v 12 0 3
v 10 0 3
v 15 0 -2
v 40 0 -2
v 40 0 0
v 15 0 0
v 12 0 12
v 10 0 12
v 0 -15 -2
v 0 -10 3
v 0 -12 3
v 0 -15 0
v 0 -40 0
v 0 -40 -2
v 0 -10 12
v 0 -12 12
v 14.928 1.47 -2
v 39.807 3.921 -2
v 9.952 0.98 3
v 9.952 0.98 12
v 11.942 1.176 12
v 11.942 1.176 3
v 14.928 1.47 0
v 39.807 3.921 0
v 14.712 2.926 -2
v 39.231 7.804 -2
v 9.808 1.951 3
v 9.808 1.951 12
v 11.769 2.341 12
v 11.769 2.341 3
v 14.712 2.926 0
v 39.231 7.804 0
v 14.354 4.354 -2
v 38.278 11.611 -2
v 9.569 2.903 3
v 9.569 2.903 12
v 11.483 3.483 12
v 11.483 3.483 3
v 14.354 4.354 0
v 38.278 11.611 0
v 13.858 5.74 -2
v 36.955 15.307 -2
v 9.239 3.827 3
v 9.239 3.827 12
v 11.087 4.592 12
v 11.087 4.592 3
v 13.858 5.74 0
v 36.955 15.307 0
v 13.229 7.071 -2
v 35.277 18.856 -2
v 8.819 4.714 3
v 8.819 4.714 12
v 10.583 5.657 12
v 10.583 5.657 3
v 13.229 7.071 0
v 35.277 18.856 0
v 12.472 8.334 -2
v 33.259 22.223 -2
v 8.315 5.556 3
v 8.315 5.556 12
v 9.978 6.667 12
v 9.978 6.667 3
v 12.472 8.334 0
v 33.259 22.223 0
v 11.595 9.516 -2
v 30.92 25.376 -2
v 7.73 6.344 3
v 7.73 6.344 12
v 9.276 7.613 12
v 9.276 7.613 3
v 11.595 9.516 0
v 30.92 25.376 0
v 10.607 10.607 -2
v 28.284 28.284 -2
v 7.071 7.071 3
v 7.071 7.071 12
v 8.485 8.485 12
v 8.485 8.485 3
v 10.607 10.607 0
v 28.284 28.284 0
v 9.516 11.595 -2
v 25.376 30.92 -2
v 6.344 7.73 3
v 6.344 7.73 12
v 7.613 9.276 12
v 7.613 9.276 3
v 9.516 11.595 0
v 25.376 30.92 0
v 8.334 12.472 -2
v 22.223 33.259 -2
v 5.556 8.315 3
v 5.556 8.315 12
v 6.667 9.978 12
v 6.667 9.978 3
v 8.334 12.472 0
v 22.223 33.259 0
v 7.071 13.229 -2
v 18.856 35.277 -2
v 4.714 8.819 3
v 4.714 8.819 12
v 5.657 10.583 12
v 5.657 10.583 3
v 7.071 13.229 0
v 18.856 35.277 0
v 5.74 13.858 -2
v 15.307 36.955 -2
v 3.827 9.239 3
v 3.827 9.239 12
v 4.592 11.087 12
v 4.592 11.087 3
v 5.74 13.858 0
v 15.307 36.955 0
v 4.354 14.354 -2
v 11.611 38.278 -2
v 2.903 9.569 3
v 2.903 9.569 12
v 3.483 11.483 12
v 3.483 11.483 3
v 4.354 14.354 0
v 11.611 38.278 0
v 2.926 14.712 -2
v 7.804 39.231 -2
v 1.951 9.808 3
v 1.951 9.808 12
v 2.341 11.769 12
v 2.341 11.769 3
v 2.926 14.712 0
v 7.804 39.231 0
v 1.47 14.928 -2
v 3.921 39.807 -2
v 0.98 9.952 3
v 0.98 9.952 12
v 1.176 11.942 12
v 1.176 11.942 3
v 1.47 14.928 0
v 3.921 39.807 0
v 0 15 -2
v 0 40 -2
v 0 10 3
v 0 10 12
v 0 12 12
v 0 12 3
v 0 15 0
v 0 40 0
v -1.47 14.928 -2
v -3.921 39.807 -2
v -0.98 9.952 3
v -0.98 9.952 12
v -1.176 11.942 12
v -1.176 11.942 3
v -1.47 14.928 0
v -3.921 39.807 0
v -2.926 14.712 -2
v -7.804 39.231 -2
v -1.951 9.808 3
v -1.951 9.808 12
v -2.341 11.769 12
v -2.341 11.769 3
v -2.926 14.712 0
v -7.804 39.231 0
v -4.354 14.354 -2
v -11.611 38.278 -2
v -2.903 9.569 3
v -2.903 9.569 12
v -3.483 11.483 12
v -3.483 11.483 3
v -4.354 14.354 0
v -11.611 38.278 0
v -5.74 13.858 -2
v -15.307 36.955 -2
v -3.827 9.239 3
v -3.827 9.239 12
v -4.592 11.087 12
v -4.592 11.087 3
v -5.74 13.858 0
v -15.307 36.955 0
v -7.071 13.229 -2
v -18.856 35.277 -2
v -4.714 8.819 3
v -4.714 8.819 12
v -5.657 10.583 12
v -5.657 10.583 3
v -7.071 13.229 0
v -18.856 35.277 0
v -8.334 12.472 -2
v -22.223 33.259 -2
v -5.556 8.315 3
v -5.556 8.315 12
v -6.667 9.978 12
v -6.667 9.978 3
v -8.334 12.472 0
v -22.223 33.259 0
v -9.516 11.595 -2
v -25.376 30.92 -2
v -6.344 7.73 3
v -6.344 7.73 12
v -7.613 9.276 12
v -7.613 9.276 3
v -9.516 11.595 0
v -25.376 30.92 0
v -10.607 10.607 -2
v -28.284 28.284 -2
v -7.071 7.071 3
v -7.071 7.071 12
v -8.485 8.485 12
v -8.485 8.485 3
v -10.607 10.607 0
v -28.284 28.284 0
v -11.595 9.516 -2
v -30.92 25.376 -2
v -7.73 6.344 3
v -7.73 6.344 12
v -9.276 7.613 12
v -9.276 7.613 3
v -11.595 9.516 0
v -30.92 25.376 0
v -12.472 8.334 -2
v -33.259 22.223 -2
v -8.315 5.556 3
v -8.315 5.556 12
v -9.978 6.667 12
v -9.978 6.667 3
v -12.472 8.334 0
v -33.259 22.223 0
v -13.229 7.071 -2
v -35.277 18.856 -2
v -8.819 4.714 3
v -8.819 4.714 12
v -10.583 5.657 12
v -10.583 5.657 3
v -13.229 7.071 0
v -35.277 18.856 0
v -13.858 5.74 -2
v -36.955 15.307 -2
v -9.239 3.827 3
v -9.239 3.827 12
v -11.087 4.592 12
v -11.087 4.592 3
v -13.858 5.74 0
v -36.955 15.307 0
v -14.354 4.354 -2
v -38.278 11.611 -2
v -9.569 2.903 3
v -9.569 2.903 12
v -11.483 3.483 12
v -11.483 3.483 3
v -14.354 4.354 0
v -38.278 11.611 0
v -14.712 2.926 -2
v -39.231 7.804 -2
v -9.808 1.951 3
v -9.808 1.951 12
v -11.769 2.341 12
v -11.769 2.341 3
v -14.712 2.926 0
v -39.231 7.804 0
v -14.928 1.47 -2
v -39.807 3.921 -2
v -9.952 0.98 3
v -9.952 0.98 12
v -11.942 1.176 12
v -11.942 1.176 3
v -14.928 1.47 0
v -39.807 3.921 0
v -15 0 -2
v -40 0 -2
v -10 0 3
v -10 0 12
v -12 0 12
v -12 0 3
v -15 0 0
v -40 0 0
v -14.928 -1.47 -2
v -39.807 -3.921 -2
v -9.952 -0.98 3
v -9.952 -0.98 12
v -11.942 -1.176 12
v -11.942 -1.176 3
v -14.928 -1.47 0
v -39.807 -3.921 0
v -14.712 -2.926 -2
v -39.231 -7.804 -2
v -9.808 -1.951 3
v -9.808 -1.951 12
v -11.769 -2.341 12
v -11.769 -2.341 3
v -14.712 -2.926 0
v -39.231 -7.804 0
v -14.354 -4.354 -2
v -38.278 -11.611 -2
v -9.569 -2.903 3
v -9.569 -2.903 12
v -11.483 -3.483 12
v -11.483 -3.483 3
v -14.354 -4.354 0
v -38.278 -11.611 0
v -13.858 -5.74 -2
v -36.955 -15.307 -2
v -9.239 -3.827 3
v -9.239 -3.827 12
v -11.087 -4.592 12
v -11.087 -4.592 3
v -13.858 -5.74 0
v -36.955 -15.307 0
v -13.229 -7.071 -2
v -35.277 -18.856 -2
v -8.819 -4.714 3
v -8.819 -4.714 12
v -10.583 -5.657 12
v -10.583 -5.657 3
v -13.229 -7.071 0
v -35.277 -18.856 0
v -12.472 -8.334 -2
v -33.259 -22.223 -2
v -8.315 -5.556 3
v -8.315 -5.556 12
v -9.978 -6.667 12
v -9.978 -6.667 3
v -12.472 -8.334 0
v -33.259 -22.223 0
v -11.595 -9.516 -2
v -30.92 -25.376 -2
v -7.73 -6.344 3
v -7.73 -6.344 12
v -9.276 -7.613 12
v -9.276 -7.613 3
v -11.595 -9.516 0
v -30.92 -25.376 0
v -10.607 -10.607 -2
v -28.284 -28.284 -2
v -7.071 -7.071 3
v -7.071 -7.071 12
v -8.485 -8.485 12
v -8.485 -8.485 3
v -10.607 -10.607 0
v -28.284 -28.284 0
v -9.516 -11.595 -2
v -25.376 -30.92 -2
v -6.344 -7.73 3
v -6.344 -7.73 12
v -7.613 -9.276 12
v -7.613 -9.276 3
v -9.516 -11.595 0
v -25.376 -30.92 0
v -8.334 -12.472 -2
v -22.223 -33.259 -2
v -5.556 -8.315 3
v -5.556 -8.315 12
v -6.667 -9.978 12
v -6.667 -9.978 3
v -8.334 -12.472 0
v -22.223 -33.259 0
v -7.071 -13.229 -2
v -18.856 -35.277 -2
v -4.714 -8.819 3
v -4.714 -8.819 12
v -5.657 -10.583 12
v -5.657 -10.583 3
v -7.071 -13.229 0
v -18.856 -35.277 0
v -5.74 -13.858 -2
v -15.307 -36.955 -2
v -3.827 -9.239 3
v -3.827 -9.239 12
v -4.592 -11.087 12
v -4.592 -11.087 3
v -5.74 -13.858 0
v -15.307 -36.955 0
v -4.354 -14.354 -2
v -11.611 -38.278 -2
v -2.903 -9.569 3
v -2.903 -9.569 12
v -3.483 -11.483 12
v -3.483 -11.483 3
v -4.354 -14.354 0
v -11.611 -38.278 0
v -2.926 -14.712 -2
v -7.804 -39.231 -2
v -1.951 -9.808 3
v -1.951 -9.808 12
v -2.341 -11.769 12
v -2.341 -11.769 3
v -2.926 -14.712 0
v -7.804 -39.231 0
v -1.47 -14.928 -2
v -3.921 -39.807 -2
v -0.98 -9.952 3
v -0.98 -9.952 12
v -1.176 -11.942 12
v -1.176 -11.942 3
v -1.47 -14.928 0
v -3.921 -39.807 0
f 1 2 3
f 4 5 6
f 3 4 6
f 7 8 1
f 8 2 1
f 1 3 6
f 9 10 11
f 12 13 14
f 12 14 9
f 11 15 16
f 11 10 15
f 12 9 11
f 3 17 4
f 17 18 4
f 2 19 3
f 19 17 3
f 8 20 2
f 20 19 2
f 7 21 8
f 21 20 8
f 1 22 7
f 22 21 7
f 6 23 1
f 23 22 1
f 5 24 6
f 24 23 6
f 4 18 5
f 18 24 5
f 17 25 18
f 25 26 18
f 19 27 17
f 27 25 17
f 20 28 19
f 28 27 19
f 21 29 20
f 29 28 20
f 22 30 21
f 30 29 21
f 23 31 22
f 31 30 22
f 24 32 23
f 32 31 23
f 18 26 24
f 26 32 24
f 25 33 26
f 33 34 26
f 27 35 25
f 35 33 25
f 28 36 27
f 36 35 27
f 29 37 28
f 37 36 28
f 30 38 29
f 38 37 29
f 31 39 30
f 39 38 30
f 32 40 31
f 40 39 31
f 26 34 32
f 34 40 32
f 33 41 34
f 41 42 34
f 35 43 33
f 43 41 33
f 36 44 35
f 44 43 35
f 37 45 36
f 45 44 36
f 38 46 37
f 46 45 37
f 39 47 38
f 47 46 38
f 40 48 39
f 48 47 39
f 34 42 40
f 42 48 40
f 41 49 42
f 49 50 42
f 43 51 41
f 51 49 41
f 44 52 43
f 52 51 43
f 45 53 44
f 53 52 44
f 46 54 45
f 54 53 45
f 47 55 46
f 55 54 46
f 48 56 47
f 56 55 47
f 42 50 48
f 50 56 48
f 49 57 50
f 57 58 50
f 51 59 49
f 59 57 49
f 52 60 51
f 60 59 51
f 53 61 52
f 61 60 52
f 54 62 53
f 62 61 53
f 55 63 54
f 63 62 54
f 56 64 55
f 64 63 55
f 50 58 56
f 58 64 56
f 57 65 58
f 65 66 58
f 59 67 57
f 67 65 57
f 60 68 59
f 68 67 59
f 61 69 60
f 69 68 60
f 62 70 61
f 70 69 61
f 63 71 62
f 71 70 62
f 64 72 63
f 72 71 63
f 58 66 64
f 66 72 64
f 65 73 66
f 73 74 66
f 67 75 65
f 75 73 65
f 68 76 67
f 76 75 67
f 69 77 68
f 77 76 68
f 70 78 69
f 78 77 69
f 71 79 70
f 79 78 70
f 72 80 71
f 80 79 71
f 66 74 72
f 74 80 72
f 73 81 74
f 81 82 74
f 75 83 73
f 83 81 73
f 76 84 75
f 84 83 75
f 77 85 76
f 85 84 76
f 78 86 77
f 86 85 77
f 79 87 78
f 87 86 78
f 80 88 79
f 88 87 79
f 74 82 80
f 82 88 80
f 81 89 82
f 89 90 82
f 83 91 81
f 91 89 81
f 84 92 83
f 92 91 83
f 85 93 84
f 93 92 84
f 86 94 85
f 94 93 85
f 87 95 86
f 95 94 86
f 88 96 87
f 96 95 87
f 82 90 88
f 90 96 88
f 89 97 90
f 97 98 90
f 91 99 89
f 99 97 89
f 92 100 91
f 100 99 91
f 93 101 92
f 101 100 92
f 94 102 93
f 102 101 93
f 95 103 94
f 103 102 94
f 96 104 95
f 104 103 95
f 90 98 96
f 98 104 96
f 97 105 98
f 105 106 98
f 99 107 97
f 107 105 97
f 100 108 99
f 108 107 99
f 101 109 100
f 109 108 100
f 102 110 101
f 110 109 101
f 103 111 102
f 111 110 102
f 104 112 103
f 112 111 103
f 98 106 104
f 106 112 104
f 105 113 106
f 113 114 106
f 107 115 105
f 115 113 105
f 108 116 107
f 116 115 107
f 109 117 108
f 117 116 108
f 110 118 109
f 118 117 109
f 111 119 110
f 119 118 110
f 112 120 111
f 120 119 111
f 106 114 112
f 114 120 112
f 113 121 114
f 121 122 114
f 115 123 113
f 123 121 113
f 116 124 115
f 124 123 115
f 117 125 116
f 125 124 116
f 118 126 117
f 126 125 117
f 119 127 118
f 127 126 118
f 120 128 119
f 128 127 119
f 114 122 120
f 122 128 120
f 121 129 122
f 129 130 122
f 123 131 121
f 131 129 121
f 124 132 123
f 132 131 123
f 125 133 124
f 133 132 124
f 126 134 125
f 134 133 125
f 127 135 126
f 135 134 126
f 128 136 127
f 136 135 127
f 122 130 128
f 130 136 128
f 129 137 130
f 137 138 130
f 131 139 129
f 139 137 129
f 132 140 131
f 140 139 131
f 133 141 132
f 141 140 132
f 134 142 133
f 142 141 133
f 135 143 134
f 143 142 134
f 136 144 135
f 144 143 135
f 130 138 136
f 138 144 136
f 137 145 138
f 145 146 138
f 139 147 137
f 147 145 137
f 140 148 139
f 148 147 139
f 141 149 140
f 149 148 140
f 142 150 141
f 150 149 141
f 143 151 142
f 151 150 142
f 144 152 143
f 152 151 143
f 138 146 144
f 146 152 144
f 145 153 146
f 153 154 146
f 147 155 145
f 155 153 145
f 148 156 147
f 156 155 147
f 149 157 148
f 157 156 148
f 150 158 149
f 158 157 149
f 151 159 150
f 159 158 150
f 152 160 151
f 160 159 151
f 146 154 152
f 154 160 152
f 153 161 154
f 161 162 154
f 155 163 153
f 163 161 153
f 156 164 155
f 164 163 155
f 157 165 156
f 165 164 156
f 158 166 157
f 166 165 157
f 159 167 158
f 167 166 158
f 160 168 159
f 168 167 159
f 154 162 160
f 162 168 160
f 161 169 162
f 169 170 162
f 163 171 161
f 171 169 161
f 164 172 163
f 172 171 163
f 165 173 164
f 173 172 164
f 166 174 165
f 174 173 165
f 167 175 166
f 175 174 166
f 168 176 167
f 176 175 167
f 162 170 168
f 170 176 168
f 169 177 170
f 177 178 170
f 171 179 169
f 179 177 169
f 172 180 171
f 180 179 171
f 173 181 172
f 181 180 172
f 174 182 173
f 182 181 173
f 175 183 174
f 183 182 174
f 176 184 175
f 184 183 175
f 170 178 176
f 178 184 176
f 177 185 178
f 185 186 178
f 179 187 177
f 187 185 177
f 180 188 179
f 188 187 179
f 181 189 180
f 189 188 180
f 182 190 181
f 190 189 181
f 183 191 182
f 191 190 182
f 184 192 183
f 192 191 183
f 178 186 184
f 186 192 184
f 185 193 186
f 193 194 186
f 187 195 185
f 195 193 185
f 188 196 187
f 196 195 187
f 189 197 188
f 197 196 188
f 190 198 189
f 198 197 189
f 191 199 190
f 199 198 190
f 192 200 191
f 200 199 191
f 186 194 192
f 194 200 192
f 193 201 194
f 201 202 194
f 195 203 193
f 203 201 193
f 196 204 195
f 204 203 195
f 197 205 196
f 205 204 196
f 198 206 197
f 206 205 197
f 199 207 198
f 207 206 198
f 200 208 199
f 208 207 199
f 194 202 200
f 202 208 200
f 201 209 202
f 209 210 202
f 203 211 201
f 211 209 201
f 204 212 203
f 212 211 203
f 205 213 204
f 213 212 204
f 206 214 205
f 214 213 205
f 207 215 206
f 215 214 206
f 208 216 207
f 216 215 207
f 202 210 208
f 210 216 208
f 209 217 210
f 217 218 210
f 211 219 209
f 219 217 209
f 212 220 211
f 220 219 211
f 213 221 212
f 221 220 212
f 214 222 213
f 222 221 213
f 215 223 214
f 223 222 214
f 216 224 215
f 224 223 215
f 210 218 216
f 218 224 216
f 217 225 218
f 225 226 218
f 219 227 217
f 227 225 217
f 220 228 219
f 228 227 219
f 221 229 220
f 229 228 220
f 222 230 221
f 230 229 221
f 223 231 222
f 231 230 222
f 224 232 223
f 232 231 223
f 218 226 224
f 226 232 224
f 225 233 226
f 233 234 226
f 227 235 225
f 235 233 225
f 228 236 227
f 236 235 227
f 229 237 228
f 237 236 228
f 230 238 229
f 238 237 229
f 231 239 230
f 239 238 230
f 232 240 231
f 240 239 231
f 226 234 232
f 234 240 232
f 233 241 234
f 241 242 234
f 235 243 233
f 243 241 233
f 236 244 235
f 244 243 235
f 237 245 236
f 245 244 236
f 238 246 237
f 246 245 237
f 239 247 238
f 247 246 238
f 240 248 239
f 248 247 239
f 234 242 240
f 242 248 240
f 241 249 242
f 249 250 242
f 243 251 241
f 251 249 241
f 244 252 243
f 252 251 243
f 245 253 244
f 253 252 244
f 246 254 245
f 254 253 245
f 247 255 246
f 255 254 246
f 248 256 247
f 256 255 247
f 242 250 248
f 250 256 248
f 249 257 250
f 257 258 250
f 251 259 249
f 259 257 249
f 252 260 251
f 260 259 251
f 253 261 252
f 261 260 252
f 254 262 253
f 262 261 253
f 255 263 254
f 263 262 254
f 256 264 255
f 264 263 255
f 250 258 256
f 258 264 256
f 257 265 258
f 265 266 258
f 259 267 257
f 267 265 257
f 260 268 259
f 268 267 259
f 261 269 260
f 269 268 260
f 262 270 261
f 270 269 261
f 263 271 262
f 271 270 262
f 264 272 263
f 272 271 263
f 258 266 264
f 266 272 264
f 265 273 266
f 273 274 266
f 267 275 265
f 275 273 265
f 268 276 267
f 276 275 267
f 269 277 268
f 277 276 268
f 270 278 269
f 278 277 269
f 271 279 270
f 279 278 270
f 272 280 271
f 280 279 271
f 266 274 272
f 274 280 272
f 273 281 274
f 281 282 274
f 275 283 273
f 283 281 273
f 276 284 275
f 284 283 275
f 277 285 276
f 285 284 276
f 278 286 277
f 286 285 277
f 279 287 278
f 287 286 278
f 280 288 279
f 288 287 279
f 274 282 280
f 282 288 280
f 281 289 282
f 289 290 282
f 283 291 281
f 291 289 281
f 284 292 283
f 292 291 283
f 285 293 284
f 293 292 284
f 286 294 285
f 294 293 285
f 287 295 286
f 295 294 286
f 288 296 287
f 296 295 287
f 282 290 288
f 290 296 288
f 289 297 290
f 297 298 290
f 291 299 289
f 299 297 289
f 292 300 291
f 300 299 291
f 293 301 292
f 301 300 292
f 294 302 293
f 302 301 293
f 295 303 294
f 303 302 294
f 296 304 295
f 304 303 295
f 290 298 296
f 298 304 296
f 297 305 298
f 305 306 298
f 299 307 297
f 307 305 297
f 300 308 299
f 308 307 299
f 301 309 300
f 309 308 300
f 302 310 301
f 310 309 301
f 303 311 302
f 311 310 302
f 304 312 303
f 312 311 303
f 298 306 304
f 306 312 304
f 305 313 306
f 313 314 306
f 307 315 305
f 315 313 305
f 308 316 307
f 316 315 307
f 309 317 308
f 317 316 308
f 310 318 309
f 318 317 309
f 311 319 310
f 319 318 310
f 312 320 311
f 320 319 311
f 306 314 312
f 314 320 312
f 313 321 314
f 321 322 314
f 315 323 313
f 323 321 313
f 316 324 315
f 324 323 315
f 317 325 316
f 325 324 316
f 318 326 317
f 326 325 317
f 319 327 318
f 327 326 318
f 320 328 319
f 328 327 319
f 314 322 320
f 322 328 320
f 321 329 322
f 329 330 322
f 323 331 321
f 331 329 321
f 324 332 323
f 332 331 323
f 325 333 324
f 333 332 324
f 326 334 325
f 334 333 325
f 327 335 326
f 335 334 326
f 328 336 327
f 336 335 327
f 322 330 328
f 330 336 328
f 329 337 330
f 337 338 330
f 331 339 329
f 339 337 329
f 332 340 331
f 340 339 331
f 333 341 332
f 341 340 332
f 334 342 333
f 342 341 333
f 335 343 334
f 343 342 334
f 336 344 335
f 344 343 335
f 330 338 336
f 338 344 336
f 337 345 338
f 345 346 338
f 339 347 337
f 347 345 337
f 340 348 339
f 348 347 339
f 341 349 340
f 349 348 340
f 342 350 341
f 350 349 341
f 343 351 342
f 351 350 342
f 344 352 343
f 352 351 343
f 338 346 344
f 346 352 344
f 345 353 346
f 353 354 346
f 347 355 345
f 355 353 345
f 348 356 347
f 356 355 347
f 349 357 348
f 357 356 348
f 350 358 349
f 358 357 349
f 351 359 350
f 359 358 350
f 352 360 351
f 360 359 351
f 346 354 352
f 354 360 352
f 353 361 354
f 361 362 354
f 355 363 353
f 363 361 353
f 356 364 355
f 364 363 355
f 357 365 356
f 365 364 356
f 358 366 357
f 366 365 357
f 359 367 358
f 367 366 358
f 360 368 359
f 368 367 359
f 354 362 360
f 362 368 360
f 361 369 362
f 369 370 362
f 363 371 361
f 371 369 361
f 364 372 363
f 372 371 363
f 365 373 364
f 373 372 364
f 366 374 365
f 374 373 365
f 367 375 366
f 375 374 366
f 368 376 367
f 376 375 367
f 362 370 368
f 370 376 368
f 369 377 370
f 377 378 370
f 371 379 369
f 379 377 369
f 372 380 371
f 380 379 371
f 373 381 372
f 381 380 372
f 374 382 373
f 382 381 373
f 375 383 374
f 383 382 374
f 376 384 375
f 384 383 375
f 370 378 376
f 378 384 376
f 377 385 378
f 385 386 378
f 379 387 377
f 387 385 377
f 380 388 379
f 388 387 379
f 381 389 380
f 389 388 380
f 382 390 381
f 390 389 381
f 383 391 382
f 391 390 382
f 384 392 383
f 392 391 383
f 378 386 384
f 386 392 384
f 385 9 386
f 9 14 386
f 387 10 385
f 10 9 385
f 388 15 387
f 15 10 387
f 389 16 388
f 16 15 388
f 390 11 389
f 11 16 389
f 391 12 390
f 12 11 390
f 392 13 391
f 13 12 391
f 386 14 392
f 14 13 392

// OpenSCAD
// =====================================================================
// Parametric Flanged Hole (Sheet Metal Piercing) for OpenSCAD
// =====================================================================

module flanged_hole(hole_r, flange_h, t, bend_r, plate_r, sweep_angle=360) {
    // RESOLUTION: Number of fragments for smooth arcs
    $fn = 64; 
    
    // We define the 2D polygon in the +X, +Y quadrant.
    // X axis = radial distance from the center of the hole.
    // Y axis = Z-height of the final 3D part.
    
    // Center of the bend arcs.
    // To maintain uniform thickness 't', the inner and outer arcs MUST share a center point.
    cx = hole_r + t + bend_r;
    cy = bend_r;

    // Generate the 3D revolved geometry
    rotate_extrude(angle = sweep_angle) {
        polygon([
            // 1. Top of the vertical flange (Inner to Outer edge)
            [hole_r, flange_h],
            [hole_r + t, flange_h],
            
            // 2. Straight vertical wall (Outer surface, going down to bend)
            [hole_r + t, cy],
            
            // 3. Inner Bend Arc (connecting Outer Flange to Top Plate)
            // Center is [cx, cy], radius is bend_r
            // Sweeps from left (180 deg) to bottom (270 deg)
            for (a = [180 : -5 : 270]) 
                [ cx + bend_r * cos(a), cy + bend_r * sin(a) ],
                
            // 4. Straight horizontal wall (Top surface of the plate)
            [cx, 0], // Ensures flush connection
            [plate_r, 0],
            
            // 5. Plate Outer Edge (Drop down by thickness)
            [plate_r, -t],
            
            // 6. Straight horizontal wall (Bottom surface of the plate)
            [cx, -t],
            
            // 7. Outer Bend Arc (connecting Bottom Plate to Inner Flange)
            // Center is [cx, cy], radius is bend_r + t (Crucial for uniform thickness!)
            // Sweeps from bottom (270 deg) back up to left (180 deg)
            for (a = [270 : 5 : 180]) 
                [ cx + (bend_r + t) * cos(a), cy + (bend_r + t) * sin(a) ],
                
            // 8. Straight vertical wall (Inner surface, going up to top)
            [hole_r, cy]
            
            // Polygon automatically closes back to [hole_r, flange_h]
        ]);
    }
}

// ==========================================
// Example Usage & Visualization
// ==========================================

// Render a Flanged Hole with a 270-degree cutaway to see the cross-section
color("SteelBlue")
flanged_hole(
    hole_r = 10,       // Radius of the final pierced hole
    flange_h = 12,     // Height of the flange above the plate
    t = 2,             // Sheet metal thickness
    bend_r = 3,        // Inner radius of the forming die
    plate_r = 40,      // Total radius of the base plate to generate
    sweep_angle = 270  // Set to 360 for a complete part
);

// Add a flat reference plane to visualize Z=0 (Top surface of the unformed plate)
%color("LightSlateGray", 0.3)
translate([0,0, -2]) 
    cylinder(r=45, h=2, $fn=64);
